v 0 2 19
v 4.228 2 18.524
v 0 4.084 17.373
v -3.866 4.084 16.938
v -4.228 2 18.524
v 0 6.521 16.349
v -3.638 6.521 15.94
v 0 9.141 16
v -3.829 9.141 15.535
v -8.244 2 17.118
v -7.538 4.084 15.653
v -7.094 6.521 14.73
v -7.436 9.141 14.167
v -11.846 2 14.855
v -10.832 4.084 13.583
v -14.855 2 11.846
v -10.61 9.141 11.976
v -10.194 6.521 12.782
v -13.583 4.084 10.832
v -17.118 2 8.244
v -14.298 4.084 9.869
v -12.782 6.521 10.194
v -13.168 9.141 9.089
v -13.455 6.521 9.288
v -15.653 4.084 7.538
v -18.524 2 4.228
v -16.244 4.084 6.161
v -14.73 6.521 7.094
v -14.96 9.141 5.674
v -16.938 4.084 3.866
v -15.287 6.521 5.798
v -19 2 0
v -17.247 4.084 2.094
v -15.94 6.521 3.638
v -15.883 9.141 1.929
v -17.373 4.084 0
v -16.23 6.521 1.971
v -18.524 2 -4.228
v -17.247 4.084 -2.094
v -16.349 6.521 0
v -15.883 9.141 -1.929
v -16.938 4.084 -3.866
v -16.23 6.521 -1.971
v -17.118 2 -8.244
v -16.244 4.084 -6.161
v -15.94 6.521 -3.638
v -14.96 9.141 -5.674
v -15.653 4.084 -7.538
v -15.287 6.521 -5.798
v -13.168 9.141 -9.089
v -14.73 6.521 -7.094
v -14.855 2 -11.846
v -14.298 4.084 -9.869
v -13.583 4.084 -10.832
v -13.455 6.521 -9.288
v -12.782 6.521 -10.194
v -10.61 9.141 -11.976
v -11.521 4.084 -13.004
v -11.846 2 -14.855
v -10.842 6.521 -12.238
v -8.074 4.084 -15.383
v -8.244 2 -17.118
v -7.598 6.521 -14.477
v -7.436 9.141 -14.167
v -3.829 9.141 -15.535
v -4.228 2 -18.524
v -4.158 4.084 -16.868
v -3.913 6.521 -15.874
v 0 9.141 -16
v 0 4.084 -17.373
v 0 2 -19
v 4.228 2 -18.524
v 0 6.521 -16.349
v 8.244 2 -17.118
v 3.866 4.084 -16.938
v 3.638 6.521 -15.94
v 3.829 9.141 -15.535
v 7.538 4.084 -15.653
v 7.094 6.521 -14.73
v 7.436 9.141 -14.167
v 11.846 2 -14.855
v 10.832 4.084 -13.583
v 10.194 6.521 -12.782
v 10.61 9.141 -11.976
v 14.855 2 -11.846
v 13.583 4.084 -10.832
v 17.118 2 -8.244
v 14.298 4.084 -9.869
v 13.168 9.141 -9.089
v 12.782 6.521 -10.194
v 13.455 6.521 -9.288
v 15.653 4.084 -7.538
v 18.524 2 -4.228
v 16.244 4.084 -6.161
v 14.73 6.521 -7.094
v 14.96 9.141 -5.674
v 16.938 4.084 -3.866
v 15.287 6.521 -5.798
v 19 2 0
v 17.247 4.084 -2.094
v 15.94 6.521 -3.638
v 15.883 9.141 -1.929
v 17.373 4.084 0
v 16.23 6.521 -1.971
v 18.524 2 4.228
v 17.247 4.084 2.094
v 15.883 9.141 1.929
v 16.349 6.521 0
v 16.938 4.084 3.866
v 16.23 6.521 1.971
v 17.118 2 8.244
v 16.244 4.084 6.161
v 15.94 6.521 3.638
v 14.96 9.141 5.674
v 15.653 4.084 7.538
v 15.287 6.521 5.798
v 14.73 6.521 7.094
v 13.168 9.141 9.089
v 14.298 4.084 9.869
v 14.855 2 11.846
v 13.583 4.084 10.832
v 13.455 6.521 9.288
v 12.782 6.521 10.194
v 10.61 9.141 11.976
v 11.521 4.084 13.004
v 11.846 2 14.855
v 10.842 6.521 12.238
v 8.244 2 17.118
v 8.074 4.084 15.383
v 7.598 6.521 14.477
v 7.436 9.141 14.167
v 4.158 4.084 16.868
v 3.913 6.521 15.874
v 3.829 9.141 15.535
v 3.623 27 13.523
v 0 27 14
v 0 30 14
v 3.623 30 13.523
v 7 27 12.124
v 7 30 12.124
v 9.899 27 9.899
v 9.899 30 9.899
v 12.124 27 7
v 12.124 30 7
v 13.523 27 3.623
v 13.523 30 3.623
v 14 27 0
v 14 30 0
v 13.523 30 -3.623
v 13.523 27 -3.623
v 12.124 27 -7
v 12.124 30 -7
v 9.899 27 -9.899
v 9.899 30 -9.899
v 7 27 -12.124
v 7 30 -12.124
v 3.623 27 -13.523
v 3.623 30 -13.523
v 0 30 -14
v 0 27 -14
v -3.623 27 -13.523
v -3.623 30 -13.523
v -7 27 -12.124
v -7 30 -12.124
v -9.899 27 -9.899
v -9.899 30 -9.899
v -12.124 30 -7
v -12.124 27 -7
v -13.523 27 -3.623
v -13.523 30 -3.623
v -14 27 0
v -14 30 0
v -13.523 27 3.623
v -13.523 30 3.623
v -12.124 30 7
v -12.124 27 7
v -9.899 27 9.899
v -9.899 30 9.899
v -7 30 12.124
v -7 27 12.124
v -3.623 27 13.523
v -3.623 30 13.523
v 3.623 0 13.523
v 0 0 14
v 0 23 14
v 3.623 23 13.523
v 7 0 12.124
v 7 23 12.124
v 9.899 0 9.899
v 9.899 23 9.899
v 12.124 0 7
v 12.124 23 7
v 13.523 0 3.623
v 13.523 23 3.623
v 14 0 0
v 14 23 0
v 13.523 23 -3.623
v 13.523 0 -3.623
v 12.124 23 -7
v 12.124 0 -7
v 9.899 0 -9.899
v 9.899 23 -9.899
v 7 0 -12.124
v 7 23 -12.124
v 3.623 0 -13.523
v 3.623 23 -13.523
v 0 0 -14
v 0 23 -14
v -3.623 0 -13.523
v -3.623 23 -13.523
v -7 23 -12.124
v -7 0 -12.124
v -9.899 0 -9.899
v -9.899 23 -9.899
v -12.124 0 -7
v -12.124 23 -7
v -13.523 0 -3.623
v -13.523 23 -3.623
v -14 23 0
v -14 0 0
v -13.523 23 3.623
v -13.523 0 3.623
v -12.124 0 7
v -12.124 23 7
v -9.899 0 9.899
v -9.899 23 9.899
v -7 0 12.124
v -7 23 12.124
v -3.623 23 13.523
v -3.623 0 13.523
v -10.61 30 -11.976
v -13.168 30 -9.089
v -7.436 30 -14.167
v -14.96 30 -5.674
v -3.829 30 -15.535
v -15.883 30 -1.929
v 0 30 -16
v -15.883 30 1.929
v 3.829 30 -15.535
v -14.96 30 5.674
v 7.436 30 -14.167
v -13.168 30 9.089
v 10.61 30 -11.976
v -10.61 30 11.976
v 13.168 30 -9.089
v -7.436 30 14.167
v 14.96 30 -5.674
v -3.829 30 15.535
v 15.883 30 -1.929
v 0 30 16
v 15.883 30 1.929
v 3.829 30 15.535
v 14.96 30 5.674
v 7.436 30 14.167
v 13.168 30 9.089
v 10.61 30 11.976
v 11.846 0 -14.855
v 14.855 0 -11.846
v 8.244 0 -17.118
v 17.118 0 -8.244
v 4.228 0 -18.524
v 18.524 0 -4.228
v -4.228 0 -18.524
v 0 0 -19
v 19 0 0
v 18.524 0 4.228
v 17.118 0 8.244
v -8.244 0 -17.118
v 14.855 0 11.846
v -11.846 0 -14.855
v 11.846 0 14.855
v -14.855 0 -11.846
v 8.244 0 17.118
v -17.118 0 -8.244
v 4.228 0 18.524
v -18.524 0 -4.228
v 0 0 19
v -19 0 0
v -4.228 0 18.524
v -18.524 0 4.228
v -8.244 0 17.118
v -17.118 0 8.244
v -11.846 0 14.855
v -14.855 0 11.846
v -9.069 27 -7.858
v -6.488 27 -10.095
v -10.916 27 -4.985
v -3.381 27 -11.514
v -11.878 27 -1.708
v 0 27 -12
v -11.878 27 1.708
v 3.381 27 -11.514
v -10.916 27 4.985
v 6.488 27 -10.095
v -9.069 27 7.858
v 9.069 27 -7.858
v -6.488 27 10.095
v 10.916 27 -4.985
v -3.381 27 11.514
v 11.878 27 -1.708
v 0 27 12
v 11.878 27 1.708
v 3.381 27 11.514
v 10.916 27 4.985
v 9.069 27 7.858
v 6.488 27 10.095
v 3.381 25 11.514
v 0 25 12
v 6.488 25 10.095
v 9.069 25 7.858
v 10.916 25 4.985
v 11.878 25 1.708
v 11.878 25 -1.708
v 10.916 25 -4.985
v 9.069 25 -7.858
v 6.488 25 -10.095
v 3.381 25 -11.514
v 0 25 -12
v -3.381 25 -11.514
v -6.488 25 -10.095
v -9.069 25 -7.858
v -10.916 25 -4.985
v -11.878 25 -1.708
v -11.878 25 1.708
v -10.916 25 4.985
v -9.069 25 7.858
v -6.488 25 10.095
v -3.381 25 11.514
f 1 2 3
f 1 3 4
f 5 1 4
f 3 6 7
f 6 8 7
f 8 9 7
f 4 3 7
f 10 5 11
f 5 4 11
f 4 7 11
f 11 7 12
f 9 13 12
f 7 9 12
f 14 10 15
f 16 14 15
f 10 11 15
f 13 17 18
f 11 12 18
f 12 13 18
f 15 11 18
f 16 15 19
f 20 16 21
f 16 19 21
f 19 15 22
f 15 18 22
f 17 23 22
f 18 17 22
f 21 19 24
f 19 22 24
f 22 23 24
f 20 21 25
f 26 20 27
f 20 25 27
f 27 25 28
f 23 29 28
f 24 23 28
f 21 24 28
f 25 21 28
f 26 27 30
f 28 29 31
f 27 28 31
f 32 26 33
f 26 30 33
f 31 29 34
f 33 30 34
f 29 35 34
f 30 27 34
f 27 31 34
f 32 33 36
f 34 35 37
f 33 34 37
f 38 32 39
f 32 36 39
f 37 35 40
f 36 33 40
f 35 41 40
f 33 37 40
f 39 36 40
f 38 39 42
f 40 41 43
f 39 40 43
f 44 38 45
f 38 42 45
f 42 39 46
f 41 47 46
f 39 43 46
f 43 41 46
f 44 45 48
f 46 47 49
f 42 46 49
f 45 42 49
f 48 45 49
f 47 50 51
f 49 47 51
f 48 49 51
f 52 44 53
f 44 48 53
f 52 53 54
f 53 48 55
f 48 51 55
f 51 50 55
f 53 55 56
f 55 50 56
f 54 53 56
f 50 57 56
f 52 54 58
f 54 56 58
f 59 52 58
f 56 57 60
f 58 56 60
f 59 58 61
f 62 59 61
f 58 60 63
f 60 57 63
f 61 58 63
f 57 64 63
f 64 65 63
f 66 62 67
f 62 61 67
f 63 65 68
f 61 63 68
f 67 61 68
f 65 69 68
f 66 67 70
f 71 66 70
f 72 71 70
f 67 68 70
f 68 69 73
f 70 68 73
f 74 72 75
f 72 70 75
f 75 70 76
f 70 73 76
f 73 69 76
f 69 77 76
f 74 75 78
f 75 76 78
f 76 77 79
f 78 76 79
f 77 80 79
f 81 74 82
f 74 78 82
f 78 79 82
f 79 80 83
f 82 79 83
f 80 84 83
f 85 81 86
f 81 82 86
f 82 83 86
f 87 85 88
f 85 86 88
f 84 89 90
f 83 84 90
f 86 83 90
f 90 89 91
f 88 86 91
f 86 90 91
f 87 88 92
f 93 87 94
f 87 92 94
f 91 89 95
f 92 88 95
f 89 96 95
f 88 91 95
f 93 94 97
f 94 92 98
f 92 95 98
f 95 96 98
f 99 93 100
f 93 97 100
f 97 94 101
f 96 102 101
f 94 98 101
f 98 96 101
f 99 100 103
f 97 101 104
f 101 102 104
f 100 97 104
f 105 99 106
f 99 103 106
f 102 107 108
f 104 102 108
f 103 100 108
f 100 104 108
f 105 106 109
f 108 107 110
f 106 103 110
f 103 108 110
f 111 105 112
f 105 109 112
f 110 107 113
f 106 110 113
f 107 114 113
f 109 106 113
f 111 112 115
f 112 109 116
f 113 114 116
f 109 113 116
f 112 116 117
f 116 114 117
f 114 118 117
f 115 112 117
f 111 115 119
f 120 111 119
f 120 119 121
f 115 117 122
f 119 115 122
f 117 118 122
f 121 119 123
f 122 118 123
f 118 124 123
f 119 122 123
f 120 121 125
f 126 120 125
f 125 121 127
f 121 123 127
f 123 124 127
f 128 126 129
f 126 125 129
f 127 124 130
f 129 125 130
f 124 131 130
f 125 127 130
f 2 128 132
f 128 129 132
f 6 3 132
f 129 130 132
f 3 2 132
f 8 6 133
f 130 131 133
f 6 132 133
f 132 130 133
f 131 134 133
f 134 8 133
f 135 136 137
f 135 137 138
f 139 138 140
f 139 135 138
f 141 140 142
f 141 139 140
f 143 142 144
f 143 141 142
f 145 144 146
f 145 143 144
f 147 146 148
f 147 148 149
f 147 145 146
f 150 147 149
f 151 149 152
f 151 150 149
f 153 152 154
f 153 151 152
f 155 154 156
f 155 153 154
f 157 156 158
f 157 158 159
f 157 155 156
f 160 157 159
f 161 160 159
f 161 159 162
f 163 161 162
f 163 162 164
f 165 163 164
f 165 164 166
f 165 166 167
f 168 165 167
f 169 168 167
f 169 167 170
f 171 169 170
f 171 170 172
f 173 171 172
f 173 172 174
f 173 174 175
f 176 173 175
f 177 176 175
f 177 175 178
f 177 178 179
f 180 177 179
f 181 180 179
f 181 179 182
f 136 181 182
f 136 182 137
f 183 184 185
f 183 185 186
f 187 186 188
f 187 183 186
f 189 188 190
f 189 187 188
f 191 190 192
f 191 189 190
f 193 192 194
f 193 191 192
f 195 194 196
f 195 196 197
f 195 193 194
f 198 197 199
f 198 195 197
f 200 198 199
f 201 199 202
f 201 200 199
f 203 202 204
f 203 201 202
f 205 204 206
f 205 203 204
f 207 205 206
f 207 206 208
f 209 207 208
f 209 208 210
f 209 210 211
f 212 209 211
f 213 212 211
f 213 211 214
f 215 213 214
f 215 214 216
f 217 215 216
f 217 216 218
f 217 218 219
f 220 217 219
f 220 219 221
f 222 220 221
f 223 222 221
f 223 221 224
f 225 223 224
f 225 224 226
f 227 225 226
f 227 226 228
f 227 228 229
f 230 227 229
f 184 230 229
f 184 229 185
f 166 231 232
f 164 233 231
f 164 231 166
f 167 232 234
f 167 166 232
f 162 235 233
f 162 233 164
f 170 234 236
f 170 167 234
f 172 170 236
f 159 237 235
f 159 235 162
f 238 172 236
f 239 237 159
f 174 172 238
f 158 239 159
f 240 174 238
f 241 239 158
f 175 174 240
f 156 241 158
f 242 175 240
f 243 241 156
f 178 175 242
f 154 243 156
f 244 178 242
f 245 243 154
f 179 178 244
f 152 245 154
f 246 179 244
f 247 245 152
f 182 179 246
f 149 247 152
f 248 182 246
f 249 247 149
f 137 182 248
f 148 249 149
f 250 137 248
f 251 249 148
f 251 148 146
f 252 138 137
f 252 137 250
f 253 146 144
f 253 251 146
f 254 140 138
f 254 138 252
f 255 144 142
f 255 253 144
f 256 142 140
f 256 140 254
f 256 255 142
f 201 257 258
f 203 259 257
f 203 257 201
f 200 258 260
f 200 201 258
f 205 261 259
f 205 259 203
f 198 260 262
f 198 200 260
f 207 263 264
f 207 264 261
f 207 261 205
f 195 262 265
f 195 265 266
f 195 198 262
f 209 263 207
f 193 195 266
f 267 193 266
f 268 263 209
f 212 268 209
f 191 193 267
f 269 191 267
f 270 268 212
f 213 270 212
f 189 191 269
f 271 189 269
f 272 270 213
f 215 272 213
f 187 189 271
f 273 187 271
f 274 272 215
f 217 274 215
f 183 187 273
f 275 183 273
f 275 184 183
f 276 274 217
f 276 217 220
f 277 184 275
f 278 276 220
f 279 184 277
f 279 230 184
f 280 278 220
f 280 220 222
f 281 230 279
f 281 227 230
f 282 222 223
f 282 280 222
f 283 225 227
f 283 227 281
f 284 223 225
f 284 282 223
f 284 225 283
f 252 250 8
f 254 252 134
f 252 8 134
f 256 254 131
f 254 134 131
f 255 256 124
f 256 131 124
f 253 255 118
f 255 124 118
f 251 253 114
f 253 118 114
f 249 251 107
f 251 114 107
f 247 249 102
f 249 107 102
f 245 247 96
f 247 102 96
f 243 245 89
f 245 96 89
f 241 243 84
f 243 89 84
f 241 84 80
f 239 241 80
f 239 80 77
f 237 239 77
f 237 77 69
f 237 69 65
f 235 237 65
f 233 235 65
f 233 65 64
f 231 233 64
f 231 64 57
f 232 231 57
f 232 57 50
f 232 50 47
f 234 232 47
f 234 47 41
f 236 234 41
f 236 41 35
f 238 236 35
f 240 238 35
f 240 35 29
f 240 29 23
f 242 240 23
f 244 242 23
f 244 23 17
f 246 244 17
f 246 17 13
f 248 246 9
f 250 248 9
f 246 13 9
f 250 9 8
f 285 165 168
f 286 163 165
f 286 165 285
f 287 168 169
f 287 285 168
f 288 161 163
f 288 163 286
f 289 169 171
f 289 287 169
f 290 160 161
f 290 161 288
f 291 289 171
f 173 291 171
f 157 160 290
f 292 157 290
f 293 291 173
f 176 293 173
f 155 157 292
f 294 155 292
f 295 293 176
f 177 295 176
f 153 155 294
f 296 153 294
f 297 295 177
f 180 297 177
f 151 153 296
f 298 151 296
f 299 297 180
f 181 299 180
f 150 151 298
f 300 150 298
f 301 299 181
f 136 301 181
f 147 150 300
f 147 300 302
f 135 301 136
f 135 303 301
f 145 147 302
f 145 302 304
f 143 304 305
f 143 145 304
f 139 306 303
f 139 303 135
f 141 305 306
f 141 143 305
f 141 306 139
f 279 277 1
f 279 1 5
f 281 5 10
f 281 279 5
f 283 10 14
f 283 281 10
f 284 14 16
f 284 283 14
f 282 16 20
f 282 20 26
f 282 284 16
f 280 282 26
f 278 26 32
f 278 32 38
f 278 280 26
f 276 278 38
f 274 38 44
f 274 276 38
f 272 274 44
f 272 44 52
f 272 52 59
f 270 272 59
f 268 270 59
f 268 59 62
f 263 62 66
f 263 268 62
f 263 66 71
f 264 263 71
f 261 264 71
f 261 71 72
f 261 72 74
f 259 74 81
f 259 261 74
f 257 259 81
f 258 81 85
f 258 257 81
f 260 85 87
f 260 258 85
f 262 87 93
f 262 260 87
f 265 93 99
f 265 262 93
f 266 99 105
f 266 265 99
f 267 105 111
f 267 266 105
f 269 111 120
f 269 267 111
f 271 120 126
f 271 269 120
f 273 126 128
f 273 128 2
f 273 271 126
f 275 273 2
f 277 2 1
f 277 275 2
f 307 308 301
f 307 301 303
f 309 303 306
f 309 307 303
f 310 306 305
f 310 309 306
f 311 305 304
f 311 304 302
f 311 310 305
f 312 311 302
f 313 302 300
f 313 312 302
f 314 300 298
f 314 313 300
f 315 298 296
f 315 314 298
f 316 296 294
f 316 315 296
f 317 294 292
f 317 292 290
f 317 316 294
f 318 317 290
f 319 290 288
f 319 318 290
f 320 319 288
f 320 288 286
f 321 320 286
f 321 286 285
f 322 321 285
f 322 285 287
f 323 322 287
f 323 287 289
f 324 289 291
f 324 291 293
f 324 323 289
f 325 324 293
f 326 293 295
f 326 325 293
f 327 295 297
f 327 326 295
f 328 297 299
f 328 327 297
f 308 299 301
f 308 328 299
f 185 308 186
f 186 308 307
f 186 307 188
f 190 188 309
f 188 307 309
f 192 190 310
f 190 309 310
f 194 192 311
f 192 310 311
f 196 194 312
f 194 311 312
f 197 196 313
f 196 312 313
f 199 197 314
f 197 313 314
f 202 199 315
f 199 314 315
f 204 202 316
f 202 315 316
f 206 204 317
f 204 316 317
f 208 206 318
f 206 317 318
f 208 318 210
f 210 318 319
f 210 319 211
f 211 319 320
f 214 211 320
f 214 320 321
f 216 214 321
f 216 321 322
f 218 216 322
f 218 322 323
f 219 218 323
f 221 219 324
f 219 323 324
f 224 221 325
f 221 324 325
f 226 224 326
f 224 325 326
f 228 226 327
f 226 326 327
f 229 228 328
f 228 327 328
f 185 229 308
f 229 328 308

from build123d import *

# Parameters (mm, degrees)
SKETCH1_R           = 16
SKETCH1_R_2         = 14
BOSS_EXTRUDE1_DEPTH = 30
BOSS_EXTRUDE3_START = -2
SKETCH3_R           = 14
SKETCH3_R_2         = 12
BOSS_EXTRUDE3_DEPTH = 2
CHAMFER1_SIZE       = 2
BOSS_EXTRUDE4_START = 2
SKETCH4_R           = 19
SKETCH4_R_2         = 16
BOSS_EXTRUDE4_DEPTH = 2
FILLET2_R           = 10


# Some blends are built 0.0001 mm under size
with BuildPart() as part:
    # Sketch1 → Boss-Extrude1 (new body)
    with BuildSketch(Plane(origin=(0, 0, 0), x_dir=(1, 0, 0), z_dir=(0, 1, 0))):
        with Locations(Location((0, 0, 0), (0, 0, 270))):
            Circle(SKETCH1_R)
        with Locations(Location((0, 0, 0), (0, 0, 270))):
            Circle(SKETCH1_R_2, mode=Mode.SUBTRACT)
    extrude(amount=BOSS_EXTRUDE1_DEPTH)

    # Sketch3 → Boss-Extrude3 (add)
    with BuildSketch(Plane(origin=(0, 27, 0), x_dir=(1, 0, 0), z_dir=(0, 1, 0)).offset(BOSS_EXTRUDE3_START)):
        with Locations(Location((0, 0, 0), (0, 0, 270))):
            Circle(SKETCH3_R)
        with Locations(Location((0, 0, 0), (0, 0, 270))):
            Circle(SKETCH3_R_2, mode=Mode.SUBTRACT)
    extrude(amount=BOSS_EXTRUDE3_DEPTH)

    # Chamfer1
    chamfer1_edges = [part.edges().sort_by_distance(p)[0] for p in [
        (0, 25, -14),
    ]]
    chamfer(chamfer1_edges, length=CHAMFER1_SIZE - 0.0001)  # a hair under: the kernel refuses the full size

    # Sketch4 → Boss-Extrude4 (add)
    with BuildSketch(Plane(origin=(0, 2, 0), x_dir=(-1, 0, 0), z_dir=(0, -1, 0)).offset(BOSS_EXTRUDE4_START)):
        with Locations(Location((0, 0, 0), (0, 0, 270))):
            Circle(SKETCH4_R)
        with Locations(Location((0, 0, 0), (0, 0, 90))):
            Circle(SKETCH4_R_2, mode=Mode.SUBTRACT)
    extrude(amount=-BOSS_EXTRUDE4_DEPTH)

    # Fillet2
    # the kernel refuses this fillet: 10 mm, written as the material it adds along each edge
    with BuildSketch(Plane(origin=(0, 2, 0), x_dir=(0, 0, 1), z_dir=(1, 0, 0))) as fillet2_piece_1:
        with BuildLine():
            CenterArc((26, -7.141428429), FILLET2_R, 134.427004001, 45.572995999)
            Line((16, -7.141428429), (15.8, -7.141428429))
            Line((15.8, -7.141428429), (15.8, 0))
            Line((15.8, 0), (16, 0.2))
            ThreePointArc((16, 0.2), (17.5, 0.2), (18.86, 0.142828569))
            Line((18.86, 0.142828569), (19, 0))
        make_face()
    revolve(axis=Axis((0, 2, 0), (0, -1, 0)))


solid = part.part
